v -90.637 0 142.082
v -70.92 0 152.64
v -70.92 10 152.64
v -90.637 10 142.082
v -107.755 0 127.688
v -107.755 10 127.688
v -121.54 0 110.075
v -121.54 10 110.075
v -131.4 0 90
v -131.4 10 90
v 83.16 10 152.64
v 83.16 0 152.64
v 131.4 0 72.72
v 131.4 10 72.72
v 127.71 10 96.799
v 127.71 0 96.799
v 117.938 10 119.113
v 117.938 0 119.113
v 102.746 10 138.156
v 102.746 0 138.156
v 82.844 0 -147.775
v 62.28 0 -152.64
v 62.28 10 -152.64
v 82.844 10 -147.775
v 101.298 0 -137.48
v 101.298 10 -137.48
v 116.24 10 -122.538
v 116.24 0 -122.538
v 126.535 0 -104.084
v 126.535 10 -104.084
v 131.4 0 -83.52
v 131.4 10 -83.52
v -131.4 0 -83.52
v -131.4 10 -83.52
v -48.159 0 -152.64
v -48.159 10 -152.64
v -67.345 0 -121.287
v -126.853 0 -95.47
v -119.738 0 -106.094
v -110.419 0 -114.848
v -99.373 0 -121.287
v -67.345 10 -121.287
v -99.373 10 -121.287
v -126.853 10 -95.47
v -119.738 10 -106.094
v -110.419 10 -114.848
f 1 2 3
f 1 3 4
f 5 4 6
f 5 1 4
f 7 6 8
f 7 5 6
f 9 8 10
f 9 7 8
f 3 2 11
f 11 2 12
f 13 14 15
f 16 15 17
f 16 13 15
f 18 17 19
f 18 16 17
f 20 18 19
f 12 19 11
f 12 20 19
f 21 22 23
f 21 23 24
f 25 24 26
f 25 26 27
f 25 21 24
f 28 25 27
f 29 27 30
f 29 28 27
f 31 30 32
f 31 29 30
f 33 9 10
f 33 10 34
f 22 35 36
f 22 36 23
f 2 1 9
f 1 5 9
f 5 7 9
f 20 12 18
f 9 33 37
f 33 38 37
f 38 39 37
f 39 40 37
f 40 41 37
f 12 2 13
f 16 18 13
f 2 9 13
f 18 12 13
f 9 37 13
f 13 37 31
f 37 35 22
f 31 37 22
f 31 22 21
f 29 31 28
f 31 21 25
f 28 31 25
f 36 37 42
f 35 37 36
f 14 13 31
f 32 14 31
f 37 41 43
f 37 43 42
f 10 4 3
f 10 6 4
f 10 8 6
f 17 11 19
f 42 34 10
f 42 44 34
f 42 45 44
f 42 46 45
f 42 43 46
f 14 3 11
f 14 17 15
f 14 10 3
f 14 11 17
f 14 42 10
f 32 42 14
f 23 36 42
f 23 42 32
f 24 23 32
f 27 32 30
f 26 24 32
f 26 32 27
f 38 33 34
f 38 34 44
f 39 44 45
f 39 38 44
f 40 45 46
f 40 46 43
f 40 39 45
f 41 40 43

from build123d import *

# Parameters (mm, degrees)
SKETCH3_W               = 262.8
SKETCH3_H               = 305.28
BOSS_EXTRUDE3_DEPTH     = 10
CUT_EXTRUDE1_DEPTH      = 202.655472527
CUT_EXTRUDE1_DEPTH_BACK = 202.655472527


with BuildPart() as part:
    # Sketch3 → Boss-Extrude3 (new body)
    with BuildSketch(Plane(origin=(0, 0, 0), x_dir=(1, 0, 0), z_dir=(0, 1, 0))):
        Rectangle(SKETCH3_W, SKETCH3_H)
    extrude(amount=BOSS_EXTRUDE3_DEPTH)

    # Sketch4 → Cut-Extrude1 (cut, two sides: drawn at the far end of the back side and taken through both)
    with BuildSketch(Plane(origin=(0, 10, 0), x_dir=(1, 0, 0), z_dir=(0, 1, 0)).offset(-CUT_EXTRUDE1_DEPTH_BACK)):
        with BuildLine():
            Line((-131.4, -90), (-131.4, -152.64))
            Line((-131.4, -152.64), (-70.92, -152.64))
            ThreePointArc((-70.92, -152.64), (-107.755247271, -127.687824951), (-131.4, -90))
        make_face()
        with BuildLine():
            Line((83.16, -152.64), (131.4, -152.64))
            Line((131.4, -152.64), (131.4, -72.72))
            ThreePointArc((131.4, -72.72), (117.938305095, -119.113391364), (83.16, -152.64))
        make_face()
        with BuildLine():
            Line((-99.372734155, 121.287125755), (-67.345468311, 121.287125755))
            Line((-67.345468311, 121.287125755), (-48.15934209, 152.64))
            Line((-48.15934209, 152.64), (-131.4, 152.64))
            Line((-131.4, 152.64), (-131.4, 83.52))
            ThreePointArc((-131.4, 83.52), (-119.737831056, 106.093689962), (-99.372734155, 121.287125755))
        make_face()
        with BuildLine():
            Line((131.4, 83.52), (131.4, 152.64))
            Line((131.4, 152.64), (62.28, 152.64))
            ThreePointArc((62.28, 152.64), (109.286007047, 130.526007047), (131.4, 83.52))
        make_face()
    extrude(amount=CUT_EXTRUDE1_DEPTH + CUT_EXTRUDE1_DEPTH_BACK, mode=Mode.SUBTRACT)


solid = part.part
